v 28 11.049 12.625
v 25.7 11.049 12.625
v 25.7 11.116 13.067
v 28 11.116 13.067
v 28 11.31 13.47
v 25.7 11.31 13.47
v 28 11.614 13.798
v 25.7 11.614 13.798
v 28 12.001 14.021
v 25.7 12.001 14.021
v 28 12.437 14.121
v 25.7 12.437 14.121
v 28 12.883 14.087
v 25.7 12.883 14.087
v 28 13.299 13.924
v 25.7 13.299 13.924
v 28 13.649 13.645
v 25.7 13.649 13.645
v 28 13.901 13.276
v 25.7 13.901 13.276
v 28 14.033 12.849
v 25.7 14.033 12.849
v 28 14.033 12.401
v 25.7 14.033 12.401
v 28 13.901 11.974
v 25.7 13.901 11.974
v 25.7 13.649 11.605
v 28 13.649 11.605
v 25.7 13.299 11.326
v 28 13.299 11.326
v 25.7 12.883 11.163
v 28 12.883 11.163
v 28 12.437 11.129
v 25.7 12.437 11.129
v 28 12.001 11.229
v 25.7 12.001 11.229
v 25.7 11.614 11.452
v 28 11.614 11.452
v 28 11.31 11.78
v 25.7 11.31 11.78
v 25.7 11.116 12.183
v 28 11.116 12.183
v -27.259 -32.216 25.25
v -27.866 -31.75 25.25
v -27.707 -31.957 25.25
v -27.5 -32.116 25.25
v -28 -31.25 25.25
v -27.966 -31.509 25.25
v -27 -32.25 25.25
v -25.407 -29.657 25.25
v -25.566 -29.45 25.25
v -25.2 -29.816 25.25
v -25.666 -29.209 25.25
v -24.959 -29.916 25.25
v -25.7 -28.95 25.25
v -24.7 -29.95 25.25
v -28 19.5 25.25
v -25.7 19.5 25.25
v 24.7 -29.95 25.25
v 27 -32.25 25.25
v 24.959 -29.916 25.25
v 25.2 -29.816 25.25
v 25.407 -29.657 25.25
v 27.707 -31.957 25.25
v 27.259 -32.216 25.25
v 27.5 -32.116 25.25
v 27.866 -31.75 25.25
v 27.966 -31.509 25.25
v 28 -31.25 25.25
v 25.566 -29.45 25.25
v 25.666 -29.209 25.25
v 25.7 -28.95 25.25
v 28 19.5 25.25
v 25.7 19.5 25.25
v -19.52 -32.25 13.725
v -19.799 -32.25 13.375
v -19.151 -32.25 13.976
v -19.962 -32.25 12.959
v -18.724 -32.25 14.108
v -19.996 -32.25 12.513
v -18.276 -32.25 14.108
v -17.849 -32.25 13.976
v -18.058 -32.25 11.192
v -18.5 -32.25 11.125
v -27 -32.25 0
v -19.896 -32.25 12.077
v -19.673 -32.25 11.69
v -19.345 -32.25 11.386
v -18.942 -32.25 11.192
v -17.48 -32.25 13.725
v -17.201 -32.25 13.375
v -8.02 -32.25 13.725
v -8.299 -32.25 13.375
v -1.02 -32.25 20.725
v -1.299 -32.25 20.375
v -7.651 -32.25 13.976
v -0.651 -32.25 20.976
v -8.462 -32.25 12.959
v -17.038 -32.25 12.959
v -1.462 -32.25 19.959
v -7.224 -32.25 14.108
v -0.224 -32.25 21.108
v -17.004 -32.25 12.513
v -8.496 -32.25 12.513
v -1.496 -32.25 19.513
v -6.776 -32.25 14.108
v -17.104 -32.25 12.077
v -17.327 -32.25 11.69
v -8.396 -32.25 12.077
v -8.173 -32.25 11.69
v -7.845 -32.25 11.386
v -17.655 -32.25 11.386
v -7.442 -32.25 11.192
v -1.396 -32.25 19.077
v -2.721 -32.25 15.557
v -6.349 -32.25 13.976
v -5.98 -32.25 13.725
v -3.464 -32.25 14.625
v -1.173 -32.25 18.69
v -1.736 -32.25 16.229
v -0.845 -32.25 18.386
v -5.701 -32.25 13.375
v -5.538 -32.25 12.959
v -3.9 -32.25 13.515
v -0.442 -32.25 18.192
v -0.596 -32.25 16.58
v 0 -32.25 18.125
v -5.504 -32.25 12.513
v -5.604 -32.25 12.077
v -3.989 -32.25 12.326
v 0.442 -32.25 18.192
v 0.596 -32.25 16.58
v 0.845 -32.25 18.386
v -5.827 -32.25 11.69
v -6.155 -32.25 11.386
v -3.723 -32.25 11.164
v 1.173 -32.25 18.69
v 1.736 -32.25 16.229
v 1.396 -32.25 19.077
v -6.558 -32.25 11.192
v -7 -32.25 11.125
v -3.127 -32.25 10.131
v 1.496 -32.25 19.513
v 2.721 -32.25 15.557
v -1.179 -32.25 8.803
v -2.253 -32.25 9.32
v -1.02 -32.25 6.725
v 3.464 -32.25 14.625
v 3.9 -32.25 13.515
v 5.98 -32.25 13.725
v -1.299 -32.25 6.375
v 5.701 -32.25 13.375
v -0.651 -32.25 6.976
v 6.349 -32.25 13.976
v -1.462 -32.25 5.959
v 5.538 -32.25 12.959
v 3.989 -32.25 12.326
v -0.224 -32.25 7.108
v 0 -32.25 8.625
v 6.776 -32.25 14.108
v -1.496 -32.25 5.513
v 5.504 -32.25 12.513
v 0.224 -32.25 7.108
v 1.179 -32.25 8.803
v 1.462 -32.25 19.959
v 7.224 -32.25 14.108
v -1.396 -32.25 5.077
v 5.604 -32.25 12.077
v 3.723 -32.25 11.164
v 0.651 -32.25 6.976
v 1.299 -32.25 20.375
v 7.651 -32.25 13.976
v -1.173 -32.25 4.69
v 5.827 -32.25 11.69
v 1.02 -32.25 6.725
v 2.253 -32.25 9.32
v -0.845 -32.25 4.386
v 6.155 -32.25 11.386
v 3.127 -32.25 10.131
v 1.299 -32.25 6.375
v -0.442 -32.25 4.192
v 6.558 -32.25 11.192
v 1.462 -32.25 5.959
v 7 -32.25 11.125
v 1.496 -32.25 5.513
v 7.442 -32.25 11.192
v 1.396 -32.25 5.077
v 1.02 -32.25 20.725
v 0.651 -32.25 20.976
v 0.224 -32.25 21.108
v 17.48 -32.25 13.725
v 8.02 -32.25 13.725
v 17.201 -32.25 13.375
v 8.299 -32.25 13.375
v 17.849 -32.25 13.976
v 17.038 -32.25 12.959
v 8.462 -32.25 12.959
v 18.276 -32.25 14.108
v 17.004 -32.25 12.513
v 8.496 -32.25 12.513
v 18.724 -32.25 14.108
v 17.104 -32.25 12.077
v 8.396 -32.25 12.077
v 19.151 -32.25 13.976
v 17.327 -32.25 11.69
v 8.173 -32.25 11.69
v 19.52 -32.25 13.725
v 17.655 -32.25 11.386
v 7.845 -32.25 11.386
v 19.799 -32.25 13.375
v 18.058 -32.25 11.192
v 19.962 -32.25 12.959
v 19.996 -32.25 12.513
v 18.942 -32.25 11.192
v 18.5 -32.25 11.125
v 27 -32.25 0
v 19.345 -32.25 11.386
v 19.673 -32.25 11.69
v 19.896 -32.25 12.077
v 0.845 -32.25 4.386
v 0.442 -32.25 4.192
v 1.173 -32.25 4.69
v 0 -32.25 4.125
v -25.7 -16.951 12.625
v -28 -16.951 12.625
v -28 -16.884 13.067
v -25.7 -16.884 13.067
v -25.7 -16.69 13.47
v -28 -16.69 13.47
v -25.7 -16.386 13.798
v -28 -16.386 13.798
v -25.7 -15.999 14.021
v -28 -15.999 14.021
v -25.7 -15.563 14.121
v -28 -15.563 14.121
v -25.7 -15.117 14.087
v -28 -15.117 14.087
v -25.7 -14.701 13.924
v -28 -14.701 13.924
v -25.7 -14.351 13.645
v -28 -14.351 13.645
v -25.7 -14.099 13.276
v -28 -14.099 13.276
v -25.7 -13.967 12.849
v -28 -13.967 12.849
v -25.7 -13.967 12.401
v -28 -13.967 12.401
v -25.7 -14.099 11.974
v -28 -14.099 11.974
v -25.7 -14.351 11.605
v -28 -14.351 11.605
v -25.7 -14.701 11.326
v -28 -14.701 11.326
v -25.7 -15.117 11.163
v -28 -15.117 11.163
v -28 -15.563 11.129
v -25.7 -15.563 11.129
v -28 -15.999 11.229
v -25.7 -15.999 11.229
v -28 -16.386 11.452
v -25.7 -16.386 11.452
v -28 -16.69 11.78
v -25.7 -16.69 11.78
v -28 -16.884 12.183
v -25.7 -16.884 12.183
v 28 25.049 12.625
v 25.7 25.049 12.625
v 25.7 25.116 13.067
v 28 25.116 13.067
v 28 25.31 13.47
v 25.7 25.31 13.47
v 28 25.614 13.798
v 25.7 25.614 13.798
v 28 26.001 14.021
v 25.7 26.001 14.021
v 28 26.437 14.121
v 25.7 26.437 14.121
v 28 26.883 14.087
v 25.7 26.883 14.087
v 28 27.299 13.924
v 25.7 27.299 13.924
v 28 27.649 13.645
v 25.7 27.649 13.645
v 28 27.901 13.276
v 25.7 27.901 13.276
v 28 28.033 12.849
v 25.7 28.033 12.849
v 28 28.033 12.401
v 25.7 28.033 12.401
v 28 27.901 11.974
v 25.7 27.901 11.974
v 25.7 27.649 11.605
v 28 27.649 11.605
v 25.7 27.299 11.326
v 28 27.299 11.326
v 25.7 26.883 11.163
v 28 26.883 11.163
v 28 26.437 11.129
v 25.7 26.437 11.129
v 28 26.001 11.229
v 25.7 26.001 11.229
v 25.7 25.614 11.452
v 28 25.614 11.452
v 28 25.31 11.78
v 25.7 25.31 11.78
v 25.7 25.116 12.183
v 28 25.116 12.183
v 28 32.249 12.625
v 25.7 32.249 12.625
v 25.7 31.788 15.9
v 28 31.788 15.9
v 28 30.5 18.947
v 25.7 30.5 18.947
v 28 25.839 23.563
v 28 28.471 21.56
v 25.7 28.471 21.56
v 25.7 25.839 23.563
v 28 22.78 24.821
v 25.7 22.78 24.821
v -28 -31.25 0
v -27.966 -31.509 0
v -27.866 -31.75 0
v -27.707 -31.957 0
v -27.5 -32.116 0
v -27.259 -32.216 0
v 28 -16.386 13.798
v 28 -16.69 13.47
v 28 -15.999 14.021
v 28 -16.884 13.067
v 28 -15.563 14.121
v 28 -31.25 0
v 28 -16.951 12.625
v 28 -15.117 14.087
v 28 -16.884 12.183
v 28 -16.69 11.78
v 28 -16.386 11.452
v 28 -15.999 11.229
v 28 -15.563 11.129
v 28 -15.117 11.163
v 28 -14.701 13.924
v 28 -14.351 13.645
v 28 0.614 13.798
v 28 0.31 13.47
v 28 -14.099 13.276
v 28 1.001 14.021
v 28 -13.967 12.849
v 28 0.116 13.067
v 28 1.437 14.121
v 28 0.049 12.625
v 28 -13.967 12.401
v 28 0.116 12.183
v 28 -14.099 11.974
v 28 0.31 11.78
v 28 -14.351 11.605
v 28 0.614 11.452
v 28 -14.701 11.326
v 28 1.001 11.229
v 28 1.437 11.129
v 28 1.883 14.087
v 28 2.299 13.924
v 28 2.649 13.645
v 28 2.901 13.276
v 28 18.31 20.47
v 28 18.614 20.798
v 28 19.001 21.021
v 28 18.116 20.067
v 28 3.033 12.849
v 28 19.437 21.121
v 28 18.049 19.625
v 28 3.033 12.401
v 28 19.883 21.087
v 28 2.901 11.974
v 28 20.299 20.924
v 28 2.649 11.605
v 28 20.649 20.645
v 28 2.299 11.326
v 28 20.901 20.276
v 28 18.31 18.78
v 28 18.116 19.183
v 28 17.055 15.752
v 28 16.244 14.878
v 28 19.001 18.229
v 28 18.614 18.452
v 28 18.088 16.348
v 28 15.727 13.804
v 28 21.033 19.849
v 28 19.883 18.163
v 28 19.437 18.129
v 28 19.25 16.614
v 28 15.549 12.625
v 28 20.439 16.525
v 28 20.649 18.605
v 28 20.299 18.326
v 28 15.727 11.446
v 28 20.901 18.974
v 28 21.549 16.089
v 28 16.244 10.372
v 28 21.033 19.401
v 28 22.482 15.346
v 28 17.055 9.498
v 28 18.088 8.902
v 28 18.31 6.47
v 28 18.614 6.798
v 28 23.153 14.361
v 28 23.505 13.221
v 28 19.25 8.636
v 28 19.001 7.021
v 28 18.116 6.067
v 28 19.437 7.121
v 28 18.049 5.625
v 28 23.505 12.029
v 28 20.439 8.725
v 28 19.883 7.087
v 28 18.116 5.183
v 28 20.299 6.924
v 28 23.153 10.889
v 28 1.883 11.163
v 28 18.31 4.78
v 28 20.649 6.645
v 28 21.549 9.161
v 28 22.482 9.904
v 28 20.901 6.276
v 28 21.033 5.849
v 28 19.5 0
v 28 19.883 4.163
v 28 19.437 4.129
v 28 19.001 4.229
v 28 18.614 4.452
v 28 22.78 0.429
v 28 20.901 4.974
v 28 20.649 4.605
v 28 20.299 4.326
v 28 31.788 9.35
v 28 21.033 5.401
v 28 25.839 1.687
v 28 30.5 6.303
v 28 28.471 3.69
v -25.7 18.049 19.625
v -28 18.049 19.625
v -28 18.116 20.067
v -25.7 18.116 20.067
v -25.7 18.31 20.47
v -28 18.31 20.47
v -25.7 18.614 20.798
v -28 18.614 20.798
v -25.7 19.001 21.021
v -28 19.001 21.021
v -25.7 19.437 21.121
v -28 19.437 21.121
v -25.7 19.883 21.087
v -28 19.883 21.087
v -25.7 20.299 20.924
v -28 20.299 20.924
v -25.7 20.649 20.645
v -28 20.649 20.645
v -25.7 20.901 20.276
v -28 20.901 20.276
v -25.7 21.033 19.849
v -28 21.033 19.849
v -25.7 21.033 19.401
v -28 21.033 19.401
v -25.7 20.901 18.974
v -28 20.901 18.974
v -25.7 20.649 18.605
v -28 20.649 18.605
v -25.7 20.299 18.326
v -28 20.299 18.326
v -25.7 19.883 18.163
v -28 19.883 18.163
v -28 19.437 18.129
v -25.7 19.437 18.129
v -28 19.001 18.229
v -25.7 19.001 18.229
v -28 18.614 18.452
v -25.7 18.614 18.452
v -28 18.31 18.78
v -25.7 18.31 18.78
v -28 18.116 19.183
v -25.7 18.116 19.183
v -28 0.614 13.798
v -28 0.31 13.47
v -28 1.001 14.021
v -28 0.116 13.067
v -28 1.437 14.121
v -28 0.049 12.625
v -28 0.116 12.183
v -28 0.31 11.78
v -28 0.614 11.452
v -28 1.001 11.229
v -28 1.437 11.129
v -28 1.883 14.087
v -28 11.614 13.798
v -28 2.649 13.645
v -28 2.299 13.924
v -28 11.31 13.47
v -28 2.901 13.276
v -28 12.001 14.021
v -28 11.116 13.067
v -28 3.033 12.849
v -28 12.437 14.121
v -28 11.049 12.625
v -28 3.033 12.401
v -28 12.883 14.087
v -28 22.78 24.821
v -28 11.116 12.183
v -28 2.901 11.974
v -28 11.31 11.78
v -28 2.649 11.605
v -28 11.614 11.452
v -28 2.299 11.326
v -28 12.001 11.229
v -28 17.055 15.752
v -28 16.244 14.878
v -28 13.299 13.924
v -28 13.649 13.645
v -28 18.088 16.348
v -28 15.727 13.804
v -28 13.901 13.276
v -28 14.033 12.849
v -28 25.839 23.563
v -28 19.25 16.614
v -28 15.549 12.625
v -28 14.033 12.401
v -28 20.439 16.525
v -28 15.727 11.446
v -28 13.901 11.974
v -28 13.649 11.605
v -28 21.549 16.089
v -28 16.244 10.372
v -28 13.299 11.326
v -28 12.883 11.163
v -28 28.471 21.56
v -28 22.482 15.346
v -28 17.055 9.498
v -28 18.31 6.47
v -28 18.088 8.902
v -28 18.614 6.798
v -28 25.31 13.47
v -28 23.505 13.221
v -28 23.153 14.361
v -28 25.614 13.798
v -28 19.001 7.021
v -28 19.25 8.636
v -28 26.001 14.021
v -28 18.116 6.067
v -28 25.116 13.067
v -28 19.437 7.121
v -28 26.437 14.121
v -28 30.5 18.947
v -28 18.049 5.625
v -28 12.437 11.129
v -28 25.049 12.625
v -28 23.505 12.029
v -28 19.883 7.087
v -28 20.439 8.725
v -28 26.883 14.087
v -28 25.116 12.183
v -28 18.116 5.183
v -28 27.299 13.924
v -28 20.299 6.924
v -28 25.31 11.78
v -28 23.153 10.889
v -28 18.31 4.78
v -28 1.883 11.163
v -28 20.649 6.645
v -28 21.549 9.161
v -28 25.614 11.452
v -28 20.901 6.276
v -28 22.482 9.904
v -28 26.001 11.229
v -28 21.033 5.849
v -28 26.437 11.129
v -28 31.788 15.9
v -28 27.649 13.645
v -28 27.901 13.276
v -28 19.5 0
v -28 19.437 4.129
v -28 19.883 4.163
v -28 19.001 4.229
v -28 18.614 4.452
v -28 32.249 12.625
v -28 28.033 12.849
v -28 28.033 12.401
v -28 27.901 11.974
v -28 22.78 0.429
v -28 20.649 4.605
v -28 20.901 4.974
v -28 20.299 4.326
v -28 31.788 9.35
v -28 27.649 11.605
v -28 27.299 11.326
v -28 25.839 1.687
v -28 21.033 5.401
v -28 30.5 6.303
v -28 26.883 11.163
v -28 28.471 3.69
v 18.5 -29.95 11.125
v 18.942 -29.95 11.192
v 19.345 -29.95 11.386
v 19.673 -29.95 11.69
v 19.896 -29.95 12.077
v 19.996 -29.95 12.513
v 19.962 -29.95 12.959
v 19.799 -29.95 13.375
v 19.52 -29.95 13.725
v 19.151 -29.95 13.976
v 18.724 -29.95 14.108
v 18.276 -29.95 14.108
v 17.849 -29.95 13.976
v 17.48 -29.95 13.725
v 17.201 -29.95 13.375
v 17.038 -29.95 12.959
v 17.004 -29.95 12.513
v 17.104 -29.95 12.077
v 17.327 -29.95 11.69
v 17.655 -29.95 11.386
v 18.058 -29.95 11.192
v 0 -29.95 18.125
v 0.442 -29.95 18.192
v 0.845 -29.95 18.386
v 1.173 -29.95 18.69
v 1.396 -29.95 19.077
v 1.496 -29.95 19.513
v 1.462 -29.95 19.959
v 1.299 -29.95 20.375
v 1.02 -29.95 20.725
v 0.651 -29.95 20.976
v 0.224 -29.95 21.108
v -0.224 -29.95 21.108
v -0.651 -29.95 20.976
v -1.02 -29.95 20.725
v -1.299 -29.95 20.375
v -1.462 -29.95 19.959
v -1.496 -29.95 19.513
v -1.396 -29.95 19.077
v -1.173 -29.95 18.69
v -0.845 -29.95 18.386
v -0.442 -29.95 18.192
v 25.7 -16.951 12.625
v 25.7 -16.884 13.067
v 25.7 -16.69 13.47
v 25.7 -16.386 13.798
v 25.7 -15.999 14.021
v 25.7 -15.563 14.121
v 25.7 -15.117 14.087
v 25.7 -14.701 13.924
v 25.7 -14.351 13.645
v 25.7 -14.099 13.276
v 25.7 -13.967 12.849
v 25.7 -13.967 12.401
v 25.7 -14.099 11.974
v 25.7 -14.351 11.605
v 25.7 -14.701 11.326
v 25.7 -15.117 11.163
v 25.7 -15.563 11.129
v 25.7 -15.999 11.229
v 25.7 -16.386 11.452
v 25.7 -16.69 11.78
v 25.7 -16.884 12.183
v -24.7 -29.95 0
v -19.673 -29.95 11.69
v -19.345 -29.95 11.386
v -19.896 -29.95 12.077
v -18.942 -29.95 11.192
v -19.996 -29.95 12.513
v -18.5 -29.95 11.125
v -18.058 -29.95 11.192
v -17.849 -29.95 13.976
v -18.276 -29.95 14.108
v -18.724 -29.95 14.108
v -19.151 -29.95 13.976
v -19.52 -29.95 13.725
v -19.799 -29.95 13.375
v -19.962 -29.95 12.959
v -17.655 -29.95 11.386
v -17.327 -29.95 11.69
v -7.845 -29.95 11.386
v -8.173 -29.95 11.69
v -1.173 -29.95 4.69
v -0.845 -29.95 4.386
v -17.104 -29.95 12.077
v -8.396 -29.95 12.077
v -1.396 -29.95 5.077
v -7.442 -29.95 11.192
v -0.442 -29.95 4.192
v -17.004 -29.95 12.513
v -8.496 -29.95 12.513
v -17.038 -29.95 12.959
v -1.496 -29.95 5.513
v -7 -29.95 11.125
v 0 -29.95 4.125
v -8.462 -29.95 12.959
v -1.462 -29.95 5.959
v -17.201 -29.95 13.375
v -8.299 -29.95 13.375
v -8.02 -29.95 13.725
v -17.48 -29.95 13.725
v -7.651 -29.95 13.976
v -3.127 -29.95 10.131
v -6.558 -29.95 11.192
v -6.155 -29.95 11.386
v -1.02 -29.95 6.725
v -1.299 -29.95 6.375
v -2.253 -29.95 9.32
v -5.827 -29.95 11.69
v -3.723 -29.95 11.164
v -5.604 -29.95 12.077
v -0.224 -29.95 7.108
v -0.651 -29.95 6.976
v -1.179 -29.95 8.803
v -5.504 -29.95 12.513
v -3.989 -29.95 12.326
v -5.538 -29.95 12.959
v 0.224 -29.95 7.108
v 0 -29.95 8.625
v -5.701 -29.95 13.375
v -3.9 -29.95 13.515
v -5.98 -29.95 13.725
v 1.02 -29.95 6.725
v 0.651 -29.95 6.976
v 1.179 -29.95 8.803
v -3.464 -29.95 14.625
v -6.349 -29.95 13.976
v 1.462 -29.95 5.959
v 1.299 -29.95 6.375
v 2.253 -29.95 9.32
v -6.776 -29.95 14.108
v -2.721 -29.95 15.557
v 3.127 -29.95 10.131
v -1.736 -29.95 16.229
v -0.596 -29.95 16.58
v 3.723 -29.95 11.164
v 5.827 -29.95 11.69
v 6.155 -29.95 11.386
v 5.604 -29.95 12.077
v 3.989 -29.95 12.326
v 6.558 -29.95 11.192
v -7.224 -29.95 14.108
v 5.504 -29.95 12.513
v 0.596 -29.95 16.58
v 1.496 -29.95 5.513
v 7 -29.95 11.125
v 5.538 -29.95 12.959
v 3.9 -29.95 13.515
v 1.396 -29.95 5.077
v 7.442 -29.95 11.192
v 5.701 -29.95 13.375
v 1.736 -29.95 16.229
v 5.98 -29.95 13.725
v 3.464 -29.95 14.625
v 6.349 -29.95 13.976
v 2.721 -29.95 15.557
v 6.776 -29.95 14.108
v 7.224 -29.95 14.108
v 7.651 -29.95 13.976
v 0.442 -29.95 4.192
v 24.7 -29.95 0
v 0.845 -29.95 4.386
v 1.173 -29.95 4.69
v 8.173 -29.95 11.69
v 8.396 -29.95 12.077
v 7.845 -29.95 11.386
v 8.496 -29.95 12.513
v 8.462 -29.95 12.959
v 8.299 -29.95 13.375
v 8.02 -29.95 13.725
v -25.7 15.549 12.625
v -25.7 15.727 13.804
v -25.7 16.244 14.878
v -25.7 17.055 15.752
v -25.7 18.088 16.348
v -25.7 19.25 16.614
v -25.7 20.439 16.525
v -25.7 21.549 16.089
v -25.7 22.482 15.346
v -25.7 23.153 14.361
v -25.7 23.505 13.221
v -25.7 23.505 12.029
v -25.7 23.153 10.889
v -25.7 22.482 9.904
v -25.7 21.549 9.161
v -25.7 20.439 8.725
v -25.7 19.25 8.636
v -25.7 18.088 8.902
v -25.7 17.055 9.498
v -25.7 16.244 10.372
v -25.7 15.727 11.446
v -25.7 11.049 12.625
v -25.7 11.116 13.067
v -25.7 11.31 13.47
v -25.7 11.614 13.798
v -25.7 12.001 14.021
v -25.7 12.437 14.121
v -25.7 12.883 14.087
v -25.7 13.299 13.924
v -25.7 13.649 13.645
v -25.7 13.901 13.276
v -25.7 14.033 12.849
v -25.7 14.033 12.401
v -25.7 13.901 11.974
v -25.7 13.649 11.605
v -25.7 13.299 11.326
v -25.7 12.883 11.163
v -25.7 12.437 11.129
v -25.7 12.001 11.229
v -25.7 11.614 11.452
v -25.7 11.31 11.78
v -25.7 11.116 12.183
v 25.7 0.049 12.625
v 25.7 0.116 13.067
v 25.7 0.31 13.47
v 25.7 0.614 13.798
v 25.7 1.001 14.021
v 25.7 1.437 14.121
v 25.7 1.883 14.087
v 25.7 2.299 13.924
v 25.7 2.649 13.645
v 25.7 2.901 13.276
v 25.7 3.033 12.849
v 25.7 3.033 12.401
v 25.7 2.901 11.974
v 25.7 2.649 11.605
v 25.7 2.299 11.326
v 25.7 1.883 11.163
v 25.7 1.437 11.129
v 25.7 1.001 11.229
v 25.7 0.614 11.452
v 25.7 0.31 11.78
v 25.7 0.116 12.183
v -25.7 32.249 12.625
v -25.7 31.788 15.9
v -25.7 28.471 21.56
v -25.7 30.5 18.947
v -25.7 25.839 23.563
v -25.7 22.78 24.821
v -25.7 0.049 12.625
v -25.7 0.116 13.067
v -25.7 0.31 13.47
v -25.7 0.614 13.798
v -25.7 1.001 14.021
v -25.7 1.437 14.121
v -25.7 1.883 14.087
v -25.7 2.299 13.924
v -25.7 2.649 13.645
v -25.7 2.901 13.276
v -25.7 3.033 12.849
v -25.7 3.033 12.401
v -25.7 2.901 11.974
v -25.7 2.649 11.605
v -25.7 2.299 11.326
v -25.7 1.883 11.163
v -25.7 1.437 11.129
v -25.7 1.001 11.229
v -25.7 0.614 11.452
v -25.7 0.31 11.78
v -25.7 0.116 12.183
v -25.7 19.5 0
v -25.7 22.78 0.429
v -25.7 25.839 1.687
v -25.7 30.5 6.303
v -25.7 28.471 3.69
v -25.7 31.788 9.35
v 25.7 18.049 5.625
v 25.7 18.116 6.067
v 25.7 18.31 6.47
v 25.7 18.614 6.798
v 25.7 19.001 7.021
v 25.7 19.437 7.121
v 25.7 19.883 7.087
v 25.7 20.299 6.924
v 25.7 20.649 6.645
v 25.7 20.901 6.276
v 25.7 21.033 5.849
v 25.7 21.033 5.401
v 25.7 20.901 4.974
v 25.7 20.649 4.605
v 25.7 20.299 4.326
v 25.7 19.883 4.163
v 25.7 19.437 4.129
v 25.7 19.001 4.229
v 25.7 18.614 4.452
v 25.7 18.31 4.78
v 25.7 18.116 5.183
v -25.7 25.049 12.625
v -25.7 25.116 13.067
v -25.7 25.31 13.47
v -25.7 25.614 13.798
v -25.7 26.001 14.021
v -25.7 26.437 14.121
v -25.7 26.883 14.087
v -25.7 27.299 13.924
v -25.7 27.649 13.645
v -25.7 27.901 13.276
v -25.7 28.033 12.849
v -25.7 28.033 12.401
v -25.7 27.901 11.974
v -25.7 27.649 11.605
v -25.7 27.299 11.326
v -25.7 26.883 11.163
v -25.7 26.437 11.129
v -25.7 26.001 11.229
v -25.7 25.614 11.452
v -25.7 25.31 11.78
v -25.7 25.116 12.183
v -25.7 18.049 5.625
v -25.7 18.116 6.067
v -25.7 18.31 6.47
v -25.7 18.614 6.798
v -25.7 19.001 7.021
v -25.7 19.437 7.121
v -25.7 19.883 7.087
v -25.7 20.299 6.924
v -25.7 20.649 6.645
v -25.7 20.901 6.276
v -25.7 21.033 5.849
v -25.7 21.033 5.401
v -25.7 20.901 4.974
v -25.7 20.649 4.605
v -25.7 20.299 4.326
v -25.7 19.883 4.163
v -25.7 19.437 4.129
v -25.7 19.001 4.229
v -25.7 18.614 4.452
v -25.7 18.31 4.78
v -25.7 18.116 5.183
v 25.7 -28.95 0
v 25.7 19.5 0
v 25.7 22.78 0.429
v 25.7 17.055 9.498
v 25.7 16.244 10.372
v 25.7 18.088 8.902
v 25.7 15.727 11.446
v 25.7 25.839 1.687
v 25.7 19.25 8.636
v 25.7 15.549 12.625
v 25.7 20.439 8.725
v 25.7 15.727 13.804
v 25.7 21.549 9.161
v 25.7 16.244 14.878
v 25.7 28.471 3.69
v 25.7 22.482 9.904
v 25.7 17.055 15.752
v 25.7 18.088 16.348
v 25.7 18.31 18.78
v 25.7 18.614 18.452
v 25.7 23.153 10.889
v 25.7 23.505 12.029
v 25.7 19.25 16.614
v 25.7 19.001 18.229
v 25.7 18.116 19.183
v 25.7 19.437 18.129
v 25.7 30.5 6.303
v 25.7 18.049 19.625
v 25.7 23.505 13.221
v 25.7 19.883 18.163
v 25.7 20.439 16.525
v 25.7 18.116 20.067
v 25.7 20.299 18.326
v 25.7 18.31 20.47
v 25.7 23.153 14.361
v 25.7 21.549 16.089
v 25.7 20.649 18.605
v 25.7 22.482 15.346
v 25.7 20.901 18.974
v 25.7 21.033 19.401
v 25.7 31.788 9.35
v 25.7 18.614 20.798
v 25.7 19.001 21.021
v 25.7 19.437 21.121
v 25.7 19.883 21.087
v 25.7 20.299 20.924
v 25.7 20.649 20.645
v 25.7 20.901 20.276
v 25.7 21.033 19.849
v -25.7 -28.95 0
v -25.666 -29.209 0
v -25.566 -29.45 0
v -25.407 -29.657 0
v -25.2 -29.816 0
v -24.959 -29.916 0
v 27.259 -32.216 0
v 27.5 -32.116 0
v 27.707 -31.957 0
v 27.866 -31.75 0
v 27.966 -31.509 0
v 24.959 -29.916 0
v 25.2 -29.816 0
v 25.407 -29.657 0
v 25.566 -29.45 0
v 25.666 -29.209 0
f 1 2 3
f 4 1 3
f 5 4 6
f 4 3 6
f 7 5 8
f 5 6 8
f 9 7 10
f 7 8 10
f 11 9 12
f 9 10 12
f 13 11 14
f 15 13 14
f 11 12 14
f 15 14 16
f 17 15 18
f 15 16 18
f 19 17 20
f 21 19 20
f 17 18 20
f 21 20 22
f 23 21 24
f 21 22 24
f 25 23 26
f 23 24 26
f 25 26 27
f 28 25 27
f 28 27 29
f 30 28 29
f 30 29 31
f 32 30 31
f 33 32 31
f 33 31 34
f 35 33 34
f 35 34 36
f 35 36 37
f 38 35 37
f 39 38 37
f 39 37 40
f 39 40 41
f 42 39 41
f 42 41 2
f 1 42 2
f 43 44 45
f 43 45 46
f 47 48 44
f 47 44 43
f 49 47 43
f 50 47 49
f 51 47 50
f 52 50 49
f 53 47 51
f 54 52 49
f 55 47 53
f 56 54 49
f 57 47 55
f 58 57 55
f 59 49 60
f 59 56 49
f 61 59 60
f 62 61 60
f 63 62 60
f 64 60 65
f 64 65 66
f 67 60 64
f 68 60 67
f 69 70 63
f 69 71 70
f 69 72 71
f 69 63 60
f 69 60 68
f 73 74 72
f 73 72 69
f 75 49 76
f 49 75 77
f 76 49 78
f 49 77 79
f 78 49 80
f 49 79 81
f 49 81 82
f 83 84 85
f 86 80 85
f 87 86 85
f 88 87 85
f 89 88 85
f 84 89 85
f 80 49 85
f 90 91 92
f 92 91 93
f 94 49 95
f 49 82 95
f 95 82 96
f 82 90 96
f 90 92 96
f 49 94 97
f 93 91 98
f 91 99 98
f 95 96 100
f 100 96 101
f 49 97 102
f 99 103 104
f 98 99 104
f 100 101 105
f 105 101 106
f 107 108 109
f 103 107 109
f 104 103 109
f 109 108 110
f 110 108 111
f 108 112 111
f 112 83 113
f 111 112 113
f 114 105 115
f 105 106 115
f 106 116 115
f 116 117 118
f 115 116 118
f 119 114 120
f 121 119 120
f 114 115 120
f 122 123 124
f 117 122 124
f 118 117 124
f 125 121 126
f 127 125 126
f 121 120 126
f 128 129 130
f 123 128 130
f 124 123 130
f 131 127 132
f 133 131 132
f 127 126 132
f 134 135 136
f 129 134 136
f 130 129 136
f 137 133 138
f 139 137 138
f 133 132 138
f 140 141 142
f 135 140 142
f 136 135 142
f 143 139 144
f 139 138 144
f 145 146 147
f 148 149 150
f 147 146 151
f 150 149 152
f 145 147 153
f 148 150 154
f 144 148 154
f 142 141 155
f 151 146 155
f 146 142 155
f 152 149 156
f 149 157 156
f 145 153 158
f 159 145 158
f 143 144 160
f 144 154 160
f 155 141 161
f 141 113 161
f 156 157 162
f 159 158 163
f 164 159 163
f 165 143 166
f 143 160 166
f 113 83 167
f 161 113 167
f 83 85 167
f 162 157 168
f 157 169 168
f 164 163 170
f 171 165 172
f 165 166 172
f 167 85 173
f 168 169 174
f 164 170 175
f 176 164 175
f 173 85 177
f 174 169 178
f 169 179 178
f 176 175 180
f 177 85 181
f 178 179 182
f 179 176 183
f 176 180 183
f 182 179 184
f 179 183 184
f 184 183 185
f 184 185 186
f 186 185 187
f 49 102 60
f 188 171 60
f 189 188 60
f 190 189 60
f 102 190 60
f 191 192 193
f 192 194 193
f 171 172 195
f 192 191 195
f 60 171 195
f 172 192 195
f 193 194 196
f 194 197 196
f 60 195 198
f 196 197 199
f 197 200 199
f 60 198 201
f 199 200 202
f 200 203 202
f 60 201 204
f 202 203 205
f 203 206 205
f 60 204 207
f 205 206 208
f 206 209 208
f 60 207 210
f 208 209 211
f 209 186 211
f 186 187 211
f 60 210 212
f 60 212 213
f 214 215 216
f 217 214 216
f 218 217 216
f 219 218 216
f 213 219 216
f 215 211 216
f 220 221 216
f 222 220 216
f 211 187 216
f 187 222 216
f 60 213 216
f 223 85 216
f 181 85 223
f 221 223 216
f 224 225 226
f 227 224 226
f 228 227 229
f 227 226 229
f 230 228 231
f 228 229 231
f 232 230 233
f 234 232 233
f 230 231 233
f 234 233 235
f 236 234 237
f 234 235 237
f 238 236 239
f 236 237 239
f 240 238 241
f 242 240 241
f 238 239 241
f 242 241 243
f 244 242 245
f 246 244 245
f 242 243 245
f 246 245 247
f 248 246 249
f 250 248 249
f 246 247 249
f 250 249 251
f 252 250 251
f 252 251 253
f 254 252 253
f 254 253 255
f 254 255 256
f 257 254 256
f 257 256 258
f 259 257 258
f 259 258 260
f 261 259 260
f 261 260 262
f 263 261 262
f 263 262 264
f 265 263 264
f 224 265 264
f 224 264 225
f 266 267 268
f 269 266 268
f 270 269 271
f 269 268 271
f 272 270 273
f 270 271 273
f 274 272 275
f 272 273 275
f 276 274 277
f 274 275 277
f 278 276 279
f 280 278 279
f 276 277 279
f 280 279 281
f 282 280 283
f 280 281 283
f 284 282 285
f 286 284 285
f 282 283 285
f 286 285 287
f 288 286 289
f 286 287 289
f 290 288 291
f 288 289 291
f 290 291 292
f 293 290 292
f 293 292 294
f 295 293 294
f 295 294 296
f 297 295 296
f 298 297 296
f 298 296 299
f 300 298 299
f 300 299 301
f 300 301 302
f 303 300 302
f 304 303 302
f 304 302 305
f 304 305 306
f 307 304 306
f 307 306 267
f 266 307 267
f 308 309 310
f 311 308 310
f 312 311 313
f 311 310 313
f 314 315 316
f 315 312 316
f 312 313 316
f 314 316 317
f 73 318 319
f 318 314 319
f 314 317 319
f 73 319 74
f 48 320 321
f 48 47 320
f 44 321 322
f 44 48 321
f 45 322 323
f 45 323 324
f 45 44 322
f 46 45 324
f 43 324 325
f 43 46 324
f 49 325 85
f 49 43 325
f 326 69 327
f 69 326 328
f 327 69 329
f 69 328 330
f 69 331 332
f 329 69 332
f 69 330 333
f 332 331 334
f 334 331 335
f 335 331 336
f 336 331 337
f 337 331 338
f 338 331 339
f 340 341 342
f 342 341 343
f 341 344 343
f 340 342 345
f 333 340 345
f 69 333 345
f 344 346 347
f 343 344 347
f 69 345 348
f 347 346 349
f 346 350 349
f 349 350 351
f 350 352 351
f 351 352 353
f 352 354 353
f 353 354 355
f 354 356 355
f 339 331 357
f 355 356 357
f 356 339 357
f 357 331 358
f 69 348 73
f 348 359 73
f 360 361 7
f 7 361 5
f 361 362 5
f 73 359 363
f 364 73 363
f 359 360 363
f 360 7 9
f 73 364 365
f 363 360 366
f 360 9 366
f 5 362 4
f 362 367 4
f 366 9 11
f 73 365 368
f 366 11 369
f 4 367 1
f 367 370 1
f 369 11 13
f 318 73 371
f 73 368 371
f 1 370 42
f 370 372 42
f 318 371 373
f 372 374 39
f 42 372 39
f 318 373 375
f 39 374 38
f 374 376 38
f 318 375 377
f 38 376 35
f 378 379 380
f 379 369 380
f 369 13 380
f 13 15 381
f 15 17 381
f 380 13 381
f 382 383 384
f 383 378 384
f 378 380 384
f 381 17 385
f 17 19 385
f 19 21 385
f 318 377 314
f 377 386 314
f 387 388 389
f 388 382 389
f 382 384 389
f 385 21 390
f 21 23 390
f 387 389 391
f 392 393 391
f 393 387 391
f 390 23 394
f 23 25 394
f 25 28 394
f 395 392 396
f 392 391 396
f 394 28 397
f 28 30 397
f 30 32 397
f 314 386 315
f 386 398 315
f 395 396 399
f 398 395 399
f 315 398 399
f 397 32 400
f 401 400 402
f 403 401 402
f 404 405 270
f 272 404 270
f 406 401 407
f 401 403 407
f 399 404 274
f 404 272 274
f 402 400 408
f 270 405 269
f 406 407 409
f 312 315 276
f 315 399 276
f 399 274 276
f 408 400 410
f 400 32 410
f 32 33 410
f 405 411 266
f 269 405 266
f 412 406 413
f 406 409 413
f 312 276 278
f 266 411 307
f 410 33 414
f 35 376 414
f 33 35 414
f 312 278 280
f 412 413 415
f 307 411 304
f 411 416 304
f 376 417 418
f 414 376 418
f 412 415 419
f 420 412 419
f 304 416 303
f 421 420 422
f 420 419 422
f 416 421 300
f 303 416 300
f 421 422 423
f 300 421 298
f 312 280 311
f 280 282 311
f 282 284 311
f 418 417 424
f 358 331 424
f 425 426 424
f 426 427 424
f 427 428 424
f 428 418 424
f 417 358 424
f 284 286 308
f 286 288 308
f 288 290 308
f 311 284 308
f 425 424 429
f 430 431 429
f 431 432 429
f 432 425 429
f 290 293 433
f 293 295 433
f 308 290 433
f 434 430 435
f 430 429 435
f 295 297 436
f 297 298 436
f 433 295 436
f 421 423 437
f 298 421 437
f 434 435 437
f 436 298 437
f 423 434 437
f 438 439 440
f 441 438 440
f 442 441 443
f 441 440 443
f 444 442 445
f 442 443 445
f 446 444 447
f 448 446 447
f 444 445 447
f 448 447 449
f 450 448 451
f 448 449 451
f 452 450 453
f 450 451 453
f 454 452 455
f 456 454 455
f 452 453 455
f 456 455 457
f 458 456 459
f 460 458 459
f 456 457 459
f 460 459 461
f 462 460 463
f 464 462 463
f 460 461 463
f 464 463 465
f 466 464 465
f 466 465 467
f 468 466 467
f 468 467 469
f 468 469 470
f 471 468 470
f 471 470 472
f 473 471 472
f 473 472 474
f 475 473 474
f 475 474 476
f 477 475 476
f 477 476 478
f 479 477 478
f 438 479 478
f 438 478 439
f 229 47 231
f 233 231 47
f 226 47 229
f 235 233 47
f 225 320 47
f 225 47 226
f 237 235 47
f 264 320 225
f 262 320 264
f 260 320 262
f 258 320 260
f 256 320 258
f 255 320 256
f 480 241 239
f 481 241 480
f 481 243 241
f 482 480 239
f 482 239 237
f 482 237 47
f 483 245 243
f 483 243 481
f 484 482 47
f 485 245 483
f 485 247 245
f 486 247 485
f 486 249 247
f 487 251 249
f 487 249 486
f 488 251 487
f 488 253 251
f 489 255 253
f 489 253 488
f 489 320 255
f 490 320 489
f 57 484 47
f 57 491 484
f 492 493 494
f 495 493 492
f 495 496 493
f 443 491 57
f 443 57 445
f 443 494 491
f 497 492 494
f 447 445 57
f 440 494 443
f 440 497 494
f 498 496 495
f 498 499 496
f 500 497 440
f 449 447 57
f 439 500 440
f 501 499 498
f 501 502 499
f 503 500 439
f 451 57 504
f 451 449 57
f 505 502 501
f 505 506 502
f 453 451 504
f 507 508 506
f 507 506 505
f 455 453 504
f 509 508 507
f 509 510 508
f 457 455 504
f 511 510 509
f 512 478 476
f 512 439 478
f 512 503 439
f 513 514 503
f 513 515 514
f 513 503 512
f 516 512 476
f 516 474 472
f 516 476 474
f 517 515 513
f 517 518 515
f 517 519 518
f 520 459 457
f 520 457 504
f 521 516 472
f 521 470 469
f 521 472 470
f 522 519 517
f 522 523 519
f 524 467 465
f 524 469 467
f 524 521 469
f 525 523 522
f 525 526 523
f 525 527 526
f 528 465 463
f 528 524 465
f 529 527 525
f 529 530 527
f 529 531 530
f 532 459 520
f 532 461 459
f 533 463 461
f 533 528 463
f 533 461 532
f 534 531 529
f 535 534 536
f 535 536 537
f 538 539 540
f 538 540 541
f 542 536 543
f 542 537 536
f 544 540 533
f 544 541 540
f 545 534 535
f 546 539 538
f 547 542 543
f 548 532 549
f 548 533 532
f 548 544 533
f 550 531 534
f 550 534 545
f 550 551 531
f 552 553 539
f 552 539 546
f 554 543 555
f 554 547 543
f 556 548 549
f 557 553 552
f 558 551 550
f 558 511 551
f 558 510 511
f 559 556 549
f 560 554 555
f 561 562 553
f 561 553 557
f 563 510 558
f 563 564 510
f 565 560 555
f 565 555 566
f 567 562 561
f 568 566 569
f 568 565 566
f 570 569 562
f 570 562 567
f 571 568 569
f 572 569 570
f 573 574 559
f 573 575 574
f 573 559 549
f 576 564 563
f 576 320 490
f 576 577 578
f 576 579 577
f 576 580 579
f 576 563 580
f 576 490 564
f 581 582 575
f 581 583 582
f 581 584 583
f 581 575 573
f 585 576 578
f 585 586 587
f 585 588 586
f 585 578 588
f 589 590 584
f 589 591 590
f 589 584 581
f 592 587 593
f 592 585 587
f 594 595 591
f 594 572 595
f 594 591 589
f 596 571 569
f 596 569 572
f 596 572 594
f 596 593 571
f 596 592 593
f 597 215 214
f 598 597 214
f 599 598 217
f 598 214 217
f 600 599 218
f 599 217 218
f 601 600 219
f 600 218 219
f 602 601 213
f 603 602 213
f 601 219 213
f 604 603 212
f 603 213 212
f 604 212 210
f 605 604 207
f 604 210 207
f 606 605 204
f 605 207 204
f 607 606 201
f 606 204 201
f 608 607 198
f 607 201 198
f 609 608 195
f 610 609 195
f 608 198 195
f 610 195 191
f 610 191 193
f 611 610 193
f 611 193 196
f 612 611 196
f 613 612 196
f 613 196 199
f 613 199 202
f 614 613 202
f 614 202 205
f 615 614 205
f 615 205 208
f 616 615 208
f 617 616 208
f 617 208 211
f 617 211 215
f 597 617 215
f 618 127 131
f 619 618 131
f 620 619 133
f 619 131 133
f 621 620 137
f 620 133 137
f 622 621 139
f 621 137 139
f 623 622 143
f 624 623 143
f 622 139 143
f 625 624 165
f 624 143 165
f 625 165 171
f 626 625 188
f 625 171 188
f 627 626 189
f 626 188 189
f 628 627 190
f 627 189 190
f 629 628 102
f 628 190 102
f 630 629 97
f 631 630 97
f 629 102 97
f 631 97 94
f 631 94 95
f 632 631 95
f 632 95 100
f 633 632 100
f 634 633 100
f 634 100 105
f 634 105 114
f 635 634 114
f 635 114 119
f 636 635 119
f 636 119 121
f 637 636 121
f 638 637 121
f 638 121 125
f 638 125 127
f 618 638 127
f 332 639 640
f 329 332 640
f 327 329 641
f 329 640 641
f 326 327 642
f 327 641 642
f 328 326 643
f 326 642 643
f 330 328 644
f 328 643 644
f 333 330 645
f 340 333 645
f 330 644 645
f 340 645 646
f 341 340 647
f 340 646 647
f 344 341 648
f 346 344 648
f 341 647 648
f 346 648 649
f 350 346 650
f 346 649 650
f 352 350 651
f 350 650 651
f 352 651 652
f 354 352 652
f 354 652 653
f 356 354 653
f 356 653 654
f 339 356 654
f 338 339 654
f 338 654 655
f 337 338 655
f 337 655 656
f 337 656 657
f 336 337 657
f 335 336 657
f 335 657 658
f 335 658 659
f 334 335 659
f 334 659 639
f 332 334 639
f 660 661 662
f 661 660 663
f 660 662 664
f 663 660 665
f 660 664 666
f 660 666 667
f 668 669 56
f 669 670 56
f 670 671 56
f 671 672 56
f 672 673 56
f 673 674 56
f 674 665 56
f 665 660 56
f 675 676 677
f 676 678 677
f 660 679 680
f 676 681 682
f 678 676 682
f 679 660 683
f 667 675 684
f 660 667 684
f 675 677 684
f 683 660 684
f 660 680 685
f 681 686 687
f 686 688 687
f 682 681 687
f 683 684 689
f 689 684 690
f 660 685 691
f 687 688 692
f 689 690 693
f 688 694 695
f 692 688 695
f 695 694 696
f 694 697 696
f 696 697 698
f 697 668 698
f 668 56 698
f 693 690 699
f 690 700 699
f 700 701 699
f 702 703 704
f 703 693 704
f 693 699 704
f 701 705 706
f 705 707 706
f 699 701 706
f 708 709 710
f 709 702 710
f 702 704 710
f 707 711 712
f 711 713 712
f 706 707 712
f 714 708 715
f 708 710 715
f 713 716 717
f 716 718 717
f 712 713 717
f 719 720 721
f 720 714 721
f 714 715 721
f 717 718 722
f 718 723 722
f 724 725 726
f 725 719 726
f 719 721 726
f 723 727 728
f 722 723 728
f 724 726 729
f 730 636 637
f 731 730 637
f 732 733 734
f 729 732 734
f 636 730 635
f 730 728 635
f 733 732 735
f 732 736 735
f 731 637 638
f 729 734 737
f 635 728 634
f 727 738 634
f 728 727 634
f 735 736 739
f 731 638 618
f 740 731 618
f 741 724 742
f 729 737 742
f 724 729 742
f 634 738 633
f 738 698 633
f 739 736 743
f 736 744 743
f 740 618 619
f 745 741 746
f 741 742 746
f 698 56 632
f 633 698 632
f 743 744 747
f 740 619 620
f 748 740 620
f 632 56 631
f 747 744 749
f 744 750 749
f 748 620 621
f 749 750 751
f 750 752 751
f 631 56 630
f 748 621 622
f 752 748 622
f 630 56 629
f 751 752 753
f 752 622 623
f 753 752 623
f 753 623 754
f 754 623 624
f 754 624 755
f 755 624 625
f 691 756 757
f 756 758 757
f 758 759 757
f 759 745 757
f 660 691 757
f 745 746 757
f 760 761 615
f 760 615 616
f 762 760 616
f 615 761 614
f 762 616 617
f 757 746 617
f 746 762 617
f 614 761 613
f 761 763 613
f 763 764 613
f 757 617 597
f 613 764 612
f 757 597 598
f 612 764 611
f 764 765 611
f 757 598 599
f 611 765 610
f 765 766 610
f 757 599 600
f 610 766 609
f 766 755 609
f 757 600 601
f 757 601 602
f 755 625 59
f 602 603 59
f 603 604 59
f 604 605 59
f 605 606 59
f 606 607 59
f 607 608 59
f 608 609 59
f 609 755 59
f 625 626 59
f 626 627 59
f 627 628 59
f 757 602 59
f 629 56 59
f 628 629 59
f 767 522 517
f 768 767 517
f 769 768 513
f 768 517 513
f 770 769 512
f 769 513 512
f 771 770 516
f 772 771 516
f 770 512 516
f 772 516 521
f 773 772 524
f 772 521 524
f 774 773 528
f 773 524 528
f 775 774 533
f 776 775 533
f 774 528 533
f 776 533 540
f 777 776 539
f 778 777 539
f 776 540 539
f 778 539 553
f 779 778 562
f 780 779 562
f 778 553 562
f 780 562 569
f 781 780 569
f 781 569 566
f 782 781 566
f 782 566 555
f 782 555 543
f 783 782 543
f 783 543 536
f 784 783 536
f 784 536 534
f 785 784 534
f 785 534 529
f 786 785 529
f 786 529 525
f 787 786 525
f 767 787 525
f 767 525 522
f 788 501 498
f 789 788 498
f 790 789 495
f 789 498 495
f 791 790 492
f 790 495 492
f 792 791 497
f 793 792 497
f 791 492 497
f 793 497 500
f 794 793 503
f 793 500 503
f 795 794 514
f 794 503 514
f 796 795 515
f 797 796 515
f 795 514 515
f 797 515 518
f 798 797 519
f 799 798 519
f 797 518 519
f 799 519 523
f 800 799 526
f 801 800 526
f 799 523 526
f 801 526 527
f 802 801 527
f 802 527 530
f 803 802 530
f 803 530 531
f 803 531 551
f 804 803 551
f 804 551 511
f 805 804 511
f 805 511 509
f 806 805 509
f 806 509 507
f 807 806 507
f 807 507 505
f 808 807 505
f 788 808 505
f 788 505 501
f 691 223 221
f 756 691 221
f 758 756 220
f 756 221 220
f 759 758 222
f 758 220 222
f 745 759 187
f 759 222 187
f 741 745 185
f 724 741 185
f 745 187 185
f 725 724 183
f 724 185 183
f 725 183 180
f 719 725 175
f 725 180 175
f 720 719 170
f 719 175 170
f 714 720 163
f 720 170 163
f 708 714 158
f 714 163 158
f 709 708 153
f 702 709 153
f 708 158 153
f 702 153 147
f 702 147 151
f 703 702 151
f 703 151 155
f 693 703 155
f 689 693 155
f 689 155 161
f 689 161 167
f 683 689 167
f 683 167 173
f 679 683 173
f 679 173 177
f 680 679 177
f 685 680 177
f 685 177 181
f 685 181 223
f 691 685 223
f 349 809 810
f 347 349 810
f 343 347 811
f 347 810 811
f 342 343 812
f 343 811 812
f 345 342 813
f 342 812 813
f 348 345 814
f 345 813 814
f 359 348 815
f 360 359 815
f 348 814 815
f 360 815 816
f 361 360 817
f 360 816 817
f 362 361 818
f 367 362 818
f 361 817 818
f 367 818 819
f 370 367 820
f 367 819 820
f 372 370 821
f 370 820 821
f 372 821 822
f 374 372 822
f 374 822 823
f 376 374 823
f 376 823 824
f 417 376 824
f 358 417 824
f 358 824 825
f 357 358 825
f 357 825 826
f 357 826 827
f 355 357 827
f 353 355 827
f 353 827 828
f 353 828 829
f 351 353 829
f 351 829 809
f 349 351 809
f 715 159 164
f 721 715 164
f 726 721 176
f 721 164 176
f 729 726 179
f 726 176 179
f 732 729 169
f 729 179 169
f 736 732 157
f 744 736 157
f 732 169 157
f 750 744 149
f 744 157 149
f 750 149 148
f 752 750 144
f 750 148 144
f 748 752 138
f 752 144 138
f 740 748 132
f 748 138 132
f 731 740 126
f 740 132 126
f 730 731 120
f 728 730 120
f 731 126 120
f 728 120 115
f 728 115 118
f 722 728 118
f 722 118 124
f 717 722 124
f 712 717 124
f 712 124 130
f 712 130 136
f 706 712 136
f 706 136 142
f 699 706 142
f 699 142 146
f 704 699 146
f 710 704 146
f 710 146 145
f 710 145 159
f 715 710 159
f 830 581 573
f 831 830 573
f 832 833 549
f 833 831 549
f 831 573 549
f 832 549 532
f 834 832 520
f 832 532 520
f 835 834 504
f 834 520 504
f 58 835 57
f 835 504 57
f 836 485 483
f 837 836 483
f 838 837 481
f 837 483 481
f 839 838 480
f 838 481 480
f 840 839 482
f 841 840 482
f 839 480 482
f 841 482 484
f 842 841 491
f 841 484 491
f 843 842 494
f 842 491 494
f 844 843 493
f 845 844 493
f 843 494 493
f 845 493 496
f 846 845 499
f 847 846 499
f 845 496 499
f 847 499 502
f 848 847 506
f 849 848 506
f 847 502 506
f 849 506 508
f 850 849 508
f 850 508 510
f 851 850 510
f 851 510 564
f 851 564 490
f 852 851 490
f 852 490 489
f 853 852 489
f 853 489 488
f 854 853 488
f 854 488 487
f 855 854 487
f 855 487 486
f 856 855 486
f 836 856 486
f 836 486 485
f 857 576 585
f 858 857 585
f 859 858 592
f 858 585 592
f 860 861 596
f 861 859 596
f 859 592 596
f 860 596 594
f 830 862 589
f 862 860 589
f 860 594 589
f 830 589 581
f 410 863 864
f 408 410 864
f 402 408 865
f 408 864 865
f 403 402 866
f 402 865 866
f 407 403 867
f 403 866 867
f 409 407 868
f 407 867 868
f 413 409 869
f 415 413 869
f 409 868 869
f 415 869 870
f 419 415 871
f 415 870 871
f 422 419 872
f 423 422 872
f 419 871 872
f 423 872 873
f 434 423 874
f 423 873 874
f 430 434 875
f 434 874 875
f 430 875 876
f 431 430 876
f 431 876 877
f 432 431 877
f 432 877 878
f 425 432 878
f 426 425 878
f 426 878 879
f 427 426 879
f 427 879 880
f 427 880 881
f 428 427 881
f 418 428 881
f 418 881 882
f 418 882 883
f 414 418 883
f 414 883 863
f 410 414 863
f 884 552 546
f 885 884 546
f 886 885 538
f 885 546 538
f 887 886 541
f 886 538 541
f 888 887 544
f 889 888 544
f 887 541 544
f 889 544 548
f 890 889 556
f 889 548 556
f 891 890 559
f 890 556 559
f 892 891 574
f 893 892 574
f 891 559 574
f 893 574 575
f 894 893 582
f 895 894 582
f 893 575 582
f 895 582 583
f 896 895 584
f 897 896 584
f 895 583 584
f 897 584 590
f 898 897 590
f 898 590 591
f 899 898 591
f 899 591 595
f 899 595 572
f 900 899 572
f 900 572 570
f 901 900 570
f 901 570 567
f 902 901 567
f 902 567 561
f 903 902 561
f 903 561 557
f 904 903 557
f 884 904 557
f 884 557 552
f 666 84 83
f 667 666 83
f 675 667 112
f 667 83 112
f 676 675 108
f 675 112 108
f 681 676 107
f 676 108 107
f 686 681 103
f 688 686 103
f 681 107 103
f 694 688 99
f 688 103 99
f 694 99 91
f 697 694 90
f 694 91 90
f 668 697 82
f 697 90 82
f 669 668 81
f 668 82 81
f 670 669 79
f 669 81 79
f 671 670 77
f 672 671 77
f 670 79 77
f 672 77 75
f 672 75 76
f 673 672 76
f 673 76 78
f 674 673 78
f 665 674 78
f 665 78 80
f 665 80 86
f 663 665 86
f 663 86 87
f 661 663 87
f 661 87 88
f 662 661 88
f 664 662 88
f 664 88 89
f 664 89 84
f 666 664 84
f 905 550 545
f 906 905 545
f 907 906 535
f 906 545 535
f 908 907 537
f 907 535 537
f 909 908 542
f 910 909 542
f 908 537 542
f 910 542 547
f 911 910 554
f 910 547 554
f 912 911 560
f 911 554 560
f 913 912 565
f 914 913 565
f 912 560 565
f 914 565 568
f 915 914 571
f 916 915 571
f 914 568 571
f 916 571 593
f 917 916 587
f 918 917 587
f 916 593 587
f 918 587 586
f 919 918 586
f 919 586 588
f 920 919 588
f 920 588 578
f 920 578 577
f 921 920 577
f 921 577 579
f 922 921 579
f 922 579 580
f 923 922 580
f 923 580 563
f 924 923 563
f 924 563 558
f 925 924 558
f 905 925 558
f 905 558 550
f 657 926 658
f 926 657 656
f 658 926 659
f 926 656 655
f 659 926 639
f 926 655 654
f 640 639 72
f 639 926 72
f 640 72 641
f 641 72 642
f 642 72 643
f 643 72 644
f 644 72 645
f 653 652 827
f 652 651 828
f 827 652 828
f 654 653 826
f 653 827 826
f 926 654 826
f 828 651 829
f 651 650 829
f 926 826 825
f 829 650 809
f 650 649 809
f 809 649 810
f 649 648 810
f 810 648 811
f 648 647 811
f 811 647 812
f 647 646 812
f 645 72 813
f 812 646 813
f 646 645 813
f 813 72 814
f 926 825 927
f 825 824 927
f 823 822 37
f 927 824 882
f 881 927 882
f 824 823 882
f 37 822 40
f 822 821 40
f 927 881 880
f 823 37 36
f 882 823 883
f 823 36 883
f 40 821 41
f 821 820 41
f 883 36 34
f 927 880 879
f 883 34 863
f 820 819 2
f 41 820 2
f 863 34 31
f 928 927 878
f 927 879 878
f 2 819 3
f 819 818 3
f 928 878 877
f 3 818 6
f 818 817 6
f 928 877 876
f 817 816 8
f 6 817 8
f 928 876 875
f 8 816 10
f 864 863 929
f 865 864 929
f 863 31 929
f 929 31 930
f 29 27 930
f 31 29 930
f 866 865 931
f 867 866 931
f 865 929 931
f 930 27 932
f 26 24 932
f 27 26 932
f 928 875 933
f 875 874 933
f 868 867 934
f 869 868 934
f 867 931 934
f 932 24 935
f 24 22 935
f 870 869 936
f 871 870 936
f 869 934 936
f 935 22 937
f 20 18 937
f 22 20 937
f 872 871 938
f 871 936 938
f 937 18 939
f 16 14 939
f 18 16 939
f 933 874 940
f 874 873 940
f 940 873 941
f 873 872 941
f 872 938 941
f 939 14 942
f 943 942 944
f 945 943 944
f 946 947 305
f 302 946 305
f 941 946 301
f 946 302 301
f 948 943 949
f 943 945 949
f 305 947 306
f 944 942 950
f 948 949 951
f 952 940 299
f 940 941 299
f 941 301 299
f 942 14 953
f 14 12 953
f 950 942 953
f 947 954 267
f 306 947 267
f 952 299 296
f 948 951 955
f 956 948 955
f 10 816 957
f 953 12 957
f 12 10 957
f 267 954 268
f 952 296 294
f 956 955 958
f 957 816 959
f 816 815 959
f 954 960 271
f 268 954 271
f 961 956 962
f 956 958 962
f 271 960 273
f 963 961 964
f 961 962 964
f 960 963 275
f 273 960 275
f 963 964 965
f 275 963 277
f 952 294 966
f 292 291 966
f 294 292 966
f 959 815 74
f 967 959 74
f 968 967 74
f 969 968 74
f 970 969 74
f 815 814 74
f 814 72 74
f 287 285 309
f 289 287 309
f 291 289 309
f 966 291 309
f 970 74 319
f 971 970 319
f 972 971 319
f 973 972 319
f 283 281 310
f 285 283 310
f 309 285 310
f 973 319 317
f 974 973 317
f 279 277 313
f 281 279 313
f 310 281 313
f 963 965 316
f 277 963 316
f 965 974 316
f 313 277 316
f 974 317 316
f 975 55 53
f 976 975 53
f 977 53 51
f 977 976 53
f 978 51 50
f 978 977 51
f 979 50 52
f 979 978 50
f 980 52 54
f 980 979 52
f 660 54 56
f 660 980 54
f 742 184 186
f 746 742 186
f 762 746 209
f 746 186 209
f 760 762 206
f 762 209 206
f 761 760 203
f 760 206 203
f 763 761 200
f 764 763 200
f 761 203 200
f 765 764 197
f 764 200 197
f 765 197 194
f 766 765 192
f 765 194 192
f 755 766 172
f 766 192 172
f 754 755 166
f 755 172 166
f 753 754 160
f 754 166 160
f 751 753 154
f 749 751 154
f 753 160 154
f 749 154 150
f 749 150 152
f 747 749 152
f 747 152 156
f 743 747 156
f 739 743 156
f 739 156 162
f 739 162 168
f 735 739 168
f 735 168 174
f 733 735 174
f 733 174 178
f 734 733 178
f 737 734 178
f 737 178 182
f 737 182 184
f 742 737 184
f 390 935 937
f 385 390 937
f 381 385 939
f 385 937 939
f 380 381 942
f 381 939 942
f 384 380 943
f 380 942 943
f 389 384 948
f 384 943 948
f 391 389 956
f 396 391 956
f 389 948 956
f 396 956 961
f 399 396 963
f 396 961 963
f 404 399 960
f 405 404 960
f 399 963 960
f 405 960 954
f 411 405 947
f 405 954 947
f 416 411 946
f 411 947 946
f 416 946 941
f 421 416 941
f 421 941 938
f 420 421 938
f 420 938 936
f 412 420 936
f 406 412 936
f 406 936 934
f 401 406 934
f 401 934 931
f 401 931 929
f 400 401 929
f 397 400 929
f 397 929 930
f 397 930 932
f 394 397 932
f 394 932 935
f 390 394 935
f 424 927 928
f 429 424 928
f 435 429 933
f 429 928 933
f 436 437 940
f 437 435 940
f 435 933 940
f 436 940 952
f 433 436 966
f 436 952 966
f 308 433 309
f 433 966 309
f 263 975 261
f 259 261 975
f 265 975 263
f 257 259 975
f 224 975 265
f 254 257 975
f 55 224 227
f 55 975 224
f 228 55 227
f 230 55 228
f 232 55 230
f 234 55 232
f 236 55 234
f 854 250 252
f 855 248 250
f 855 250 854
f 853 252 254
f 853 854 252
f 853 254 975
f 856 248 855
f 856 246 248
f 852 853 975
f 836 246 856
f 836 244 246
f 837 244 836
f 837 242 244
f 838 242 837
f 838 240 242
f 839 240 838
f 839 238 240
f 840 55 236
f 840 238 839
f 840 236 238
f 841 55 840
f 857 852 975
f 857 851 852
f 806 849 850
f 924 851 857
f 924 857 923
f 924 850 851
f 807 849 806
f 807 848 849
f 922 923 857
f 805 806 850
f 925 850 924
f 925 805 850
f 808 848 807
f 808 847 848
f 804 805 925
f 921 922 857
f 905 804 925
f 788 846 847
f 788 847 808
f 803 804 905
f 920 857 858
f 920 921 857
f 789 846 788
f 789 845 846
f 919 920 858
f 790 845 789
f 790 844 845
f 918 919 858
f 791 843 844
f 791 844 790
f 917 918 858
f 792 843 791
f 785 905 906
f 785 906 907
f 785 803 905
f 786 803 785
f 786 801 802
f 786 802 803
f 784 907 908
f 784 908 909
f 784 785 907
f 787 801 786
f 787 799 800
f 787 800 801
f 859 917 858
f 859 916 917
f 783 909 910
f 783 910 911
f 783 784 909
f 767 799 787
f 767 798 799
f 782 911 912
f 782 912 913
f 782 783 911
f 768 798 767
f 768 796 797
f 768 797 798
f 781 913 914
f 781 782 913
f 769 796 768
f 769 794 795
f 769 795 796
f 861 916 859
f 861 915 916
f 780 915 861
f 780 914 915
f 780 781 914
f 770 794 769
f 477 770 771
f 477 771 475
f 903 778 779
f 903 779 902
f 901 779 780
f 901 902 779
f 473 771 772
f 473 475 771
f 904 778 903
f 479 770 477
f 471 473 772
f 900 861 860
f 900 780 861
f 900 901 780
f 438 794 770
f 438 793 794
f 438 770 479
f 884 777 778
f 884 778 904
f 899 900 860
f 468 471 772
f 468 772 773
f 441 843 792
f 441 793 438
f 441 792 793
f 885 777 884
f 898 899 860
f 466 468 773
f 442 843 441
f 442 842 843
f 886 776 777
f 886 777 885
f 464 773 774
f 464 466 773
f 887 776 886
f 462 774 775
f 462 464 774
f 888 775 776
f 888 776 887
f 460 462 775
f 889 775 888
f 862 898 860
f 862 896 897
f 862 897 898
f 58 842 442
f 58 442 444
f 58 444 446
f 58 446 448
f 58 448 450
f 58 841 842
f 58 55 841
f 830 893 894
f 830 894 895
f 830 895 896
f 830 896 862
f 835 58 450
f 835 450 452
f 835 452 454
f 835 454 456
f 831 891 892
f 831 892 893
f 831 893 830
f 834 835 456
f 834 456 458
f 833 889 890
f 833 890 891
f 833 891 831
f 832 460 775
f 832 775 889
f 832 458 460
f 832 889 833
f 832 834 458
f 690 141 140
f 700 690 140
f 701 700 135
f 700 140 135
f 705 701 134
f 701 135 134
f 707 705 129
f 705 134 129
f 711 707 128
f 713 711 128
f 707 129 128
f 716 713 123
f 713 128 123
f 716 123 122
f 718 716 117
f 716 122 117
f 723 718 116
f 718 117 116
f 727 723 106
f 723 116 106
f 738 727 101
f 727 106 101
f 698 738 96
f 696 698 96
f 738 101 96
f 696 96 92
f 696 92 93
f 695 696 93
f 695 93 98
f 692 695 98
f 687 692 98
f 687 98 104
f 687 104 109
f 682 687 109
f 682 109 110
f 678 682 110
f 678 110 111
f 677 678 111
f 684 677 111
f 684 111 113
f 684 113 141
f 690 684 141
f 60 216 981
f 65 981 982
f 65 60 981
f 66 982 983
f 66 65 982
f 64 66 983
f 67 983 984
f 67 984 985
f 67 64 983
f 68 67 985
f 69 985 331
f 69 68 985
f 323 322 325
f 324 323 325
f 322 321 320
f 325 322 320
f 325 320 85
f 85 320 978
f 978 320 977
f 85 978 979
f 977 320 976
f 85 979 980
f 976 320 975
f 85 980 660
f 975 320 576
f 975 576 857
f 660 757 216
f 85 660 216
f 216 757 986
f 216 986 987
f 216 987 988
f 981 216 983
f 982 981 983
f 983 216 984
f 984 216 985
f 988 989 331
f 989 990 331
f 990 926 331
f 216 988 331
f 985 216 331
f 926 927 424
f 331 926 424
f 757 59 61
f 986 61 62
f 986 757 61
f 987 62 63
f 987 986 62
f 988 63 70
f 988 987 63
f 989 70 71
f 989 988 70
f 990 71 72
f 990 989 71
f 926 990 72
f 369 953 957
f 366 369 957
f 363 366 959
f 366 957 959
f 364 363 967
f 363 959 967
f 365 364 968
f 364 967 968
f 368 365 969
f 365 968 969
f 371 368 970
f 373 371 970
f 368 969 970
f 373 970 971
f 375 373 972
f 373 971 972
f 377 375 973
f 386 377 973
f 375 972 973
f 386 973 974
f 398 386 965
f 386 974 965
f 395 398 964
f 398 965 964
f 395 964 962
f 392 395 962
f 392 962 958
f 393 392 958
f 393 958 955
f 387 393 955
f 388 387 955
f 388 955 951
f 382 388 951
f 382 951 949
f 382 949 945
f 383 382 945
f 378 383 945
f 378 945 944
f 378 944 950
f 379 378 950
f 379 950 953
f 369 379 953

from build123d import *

# Parameters (mm, degrees)
SKETCH1_W           = 56
SKETCH1_H           = 64.5
BOSS_EXTRUDE1_DEPTH = 25.25
SKETCH2_W           = 51.4
SKETCH2_H           = 62.2
CUT_EXTRUDE1_DEPTH  = 50.614765947
FILLET1_R           = 1
FILLET3_R           = 12.75
SKETCH4_R           = 4
SKETCH4_R_2         = 1.5
CUT_EXTRUDE3_DEPTH  = 75.710999554
SKETCH5_R           = 4
SKETCH5_R_2         = 1.5
CUT_EXTRUDE4_DEPTH  = 70.380292591


with BuildPart() as part:
    # Sketch1 → Boss-Extrude1 (new body)
    with BuildSketch(Plane.XY):
        Rectangle(SKETCH1_W, SKETCH1_H)
    extrude(amount=BOSS_EXTRUDE1_DEPTH)

    # Sketch2 → Cut-Extrude1 (cut, through all)
    with BuildSketch(Plane.XY.offset(25.25)):
        with Locations((0, 1.15)):
            Rectangle(SKETCH2_W, SKETCH2_H)
    extrude(amount=-CUT_EXTRUDE1_DEPTH, mode=Mode.SUBTRACT)

    # Fillet1
    fillet1_edges = [part.edges().sort_by_distance(p)[0] for p in [
        (-25.7, -29.95, 12.625),
        (25.7, -29.95, 12.625),
        (28, -32.25, 12.625),
        (-28, -32.25, 12.625),
    ]]
    fillet(fillet1_edges, radius=FILLET1_R)

    # Fillet3
    # the kernel refuses this fillet: 12.75 mm, written as the material it takes off along each edge
    with BuildSketch(Plane(origin=(-59.875, 32.25, 25.25), x_dir=(0, 0, -1), z_dir=(1, 0, 0)), Plane(origin=(-6.175, 32.25, 25.25), x_dir=(0, 0, -1), z_dir=(1, 0, 0)), Plane(origin=(-59.875, 32.25, 0), x_dir=(0, -1, 0), z_dir=(1, 0, 0)), Plane(origin=(-6.175, 32.25, 0), x_dir=(0, -1, 0), z_dir=(1, 0, 0))) as fillet3_piece_1:
        with BuildLine():
            CenterArc((FILLET3_R, -FILLET3_R), FILLET3_R, 90, 90)
            Line((0, -FILLET3_R), (0, 0))
            Line((0, 0), (FILLET3_R, 0))
        make_face()
    extrude(amount=66.05, mode=Mode.SUBTRACT)

    # Sketch4 → Cut-Extrude3 (cut, through all)
    with BuildSketch(Plane.XZ.offset(32.25)):
        with Locations(Location((0, 12.625, 0), (0, 0, 270))):
            Circle(SKETCH4_R)
        with Locations(Location((7, 12.625, 0), (0, 0, 270))):
            Circle(SKETCH4_R_2)
        with Locations(Location((-7, 12.625, 0), (0, 0, 270))):
            Circle(SKETCH4_R_2)
        with Locations(Location((0, 5.625, 0), (0, 0, 270))):
            Circle(SKETCH4_R_2)
        with Locations(Location((0, 19.625, 0), (0, 0, 270))):
            Circle(SKETCH4_R_2)
        with Locations(Location((18.5, 12.625, 0), (0, 0, 270))):
            Circle(SKETCH4_R_2)
        with Locations(Location((-18.5, 12.625, 0), (0, 0, 270))):
            Circle(SKETCH4_R_2)
    extrude(amount=-CUT_EXTRUDE3_DEPTH, mode=Mode.SUBTRACT)

    # Sketch5 → Cut-Extrude4 (cut, through all)
    with BuildSketch(Plane.ZY.offset(28)):
        with Locations(Location((12.625, 19.54938724, 0), (0, 0, 270))):
            Circle(SKETCH5_R)
        with Locations(Location((12.625, 26.54938724, 0), (0, 0, 270))):
            Circle(SKETCH5_R_2)
        with Locations(Location((19.625, 19.54938724, 0), (0, 0, 270))):
            Circle(SKETCH5_R_2)
        with Locations(Location((12.625, 12.54938724, 0), (0, 0, 270))):
            Circle(SKETCH5_R_2)
        with Locations(Location((5.625, 19.54938724, 0), (0, 0, 270))):
            Circle(SKETCH5_R_2)
        with Locations(Location((12.625, 1.54938724, 0), (0, 0, 270))):
            Circle(SKETCH5_R_2)
        with Locations(Location((12.625, -15.45061276, 0), (0, 0, 270))):
            Circle(SKETCH5_R_2)
    extrude(amount=-CUT_EXTRUDE4_DEPTH, mode=Mode.SUBTRACT)


solid = part.part
